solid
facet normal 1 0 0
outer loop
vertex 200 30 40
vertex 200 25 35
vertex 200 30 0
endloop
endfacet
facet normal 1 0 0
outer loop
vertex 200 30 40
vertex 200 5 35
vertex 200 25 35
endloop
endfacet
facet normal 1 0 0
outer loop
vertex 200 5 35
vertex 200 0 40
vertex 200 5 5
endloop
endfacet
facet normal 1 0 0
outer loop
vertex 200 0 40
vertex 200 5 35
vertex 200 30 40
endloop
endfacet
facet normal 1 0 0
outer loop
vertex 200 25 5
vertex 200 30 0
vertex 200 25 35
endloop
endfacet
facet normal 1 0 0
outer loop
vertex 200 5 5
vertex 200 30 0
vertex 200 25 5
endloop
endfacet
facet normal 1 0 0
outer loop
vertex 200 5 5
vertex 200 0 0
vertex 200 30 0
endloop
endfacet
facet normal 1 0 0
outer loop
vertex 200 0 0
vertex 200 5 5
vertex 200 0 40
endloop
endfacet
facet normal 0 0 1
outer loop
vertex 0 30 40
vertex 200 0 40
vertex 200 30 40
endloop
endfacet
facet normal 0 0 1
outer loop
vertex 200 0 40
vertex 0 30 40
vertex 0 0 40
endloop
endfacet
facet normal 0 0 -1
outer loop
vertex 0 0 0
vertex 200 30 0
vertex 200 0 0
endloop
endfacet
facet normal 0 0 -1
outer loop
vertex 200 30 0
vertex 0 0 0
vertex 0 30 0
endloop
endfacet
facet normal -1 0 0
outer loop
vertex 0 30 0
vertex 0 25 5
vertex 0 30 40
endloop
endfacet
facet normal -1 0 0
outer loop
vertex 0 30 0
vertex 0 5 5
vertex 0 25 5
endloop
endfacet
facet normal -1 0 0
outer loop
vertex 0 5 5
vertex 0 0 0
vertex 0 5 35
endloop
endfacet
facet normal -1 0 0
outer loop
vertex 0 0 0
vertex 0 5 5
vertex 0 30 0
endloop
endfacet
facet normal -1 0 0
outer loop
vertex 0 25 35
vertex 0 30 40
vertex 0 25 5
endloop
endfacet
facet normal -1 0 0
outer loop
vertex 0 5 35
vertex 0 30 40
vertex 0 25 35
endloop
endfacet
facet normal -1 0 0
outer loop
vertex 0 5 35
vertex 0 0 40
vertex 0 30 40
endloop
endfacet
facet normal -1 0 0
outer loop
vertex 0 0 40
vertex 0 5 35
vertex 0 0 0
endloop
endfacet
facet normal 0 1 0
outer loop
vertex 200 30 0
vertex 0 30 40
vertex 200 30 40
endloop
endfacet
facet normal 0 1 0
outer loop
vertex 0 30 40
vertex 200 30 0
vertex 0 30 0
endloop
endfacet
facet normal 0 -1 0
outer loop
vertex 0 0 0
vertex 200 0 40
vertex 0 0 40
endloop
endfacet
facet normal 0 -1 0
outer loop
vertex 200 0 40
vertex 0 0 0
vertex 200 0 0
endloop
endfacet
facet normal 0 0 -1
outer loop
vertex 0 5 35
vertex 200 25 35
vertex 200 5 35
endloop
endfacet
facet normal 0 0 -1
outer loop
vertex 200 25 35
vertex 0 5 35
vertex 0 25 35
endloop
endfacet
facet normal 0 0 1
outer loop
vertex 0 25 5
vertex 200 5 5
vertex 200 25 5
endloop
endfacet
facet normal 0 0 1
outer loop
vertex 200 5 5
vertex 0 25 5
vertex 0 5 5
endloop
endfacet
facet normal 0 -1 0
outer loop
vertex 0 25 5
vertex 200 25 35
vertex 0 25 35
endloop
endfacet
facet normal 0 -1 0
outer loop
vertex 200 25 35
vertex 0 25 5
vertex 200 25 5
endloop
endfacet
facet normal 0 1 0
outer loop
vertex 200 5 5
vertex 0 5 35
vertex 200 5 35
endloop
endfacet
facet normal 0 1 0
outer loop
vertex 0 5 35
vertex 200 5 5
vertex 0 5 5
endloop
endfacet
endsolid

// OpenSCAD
$fn = 32;

// ----------------------------------------------------------------------
// Box beam: 200-250 mm hollow beam
// ----------------------------------------------------------------------

// --- parameters (mm) ---
beam_l = 200;             // beam length, X
beam_w = 30;              // beam width, Y
beam_h = 40;              // beam height, Z
wall = 5;                 // wall thickness

difference() {
  cube([beam_l, beam_w, beam_h]);
  translate([-1, wall, wall])
    cube([beam_l + 2, beam_w - 2 * wall, beam_h - 2 * wall]);
}
